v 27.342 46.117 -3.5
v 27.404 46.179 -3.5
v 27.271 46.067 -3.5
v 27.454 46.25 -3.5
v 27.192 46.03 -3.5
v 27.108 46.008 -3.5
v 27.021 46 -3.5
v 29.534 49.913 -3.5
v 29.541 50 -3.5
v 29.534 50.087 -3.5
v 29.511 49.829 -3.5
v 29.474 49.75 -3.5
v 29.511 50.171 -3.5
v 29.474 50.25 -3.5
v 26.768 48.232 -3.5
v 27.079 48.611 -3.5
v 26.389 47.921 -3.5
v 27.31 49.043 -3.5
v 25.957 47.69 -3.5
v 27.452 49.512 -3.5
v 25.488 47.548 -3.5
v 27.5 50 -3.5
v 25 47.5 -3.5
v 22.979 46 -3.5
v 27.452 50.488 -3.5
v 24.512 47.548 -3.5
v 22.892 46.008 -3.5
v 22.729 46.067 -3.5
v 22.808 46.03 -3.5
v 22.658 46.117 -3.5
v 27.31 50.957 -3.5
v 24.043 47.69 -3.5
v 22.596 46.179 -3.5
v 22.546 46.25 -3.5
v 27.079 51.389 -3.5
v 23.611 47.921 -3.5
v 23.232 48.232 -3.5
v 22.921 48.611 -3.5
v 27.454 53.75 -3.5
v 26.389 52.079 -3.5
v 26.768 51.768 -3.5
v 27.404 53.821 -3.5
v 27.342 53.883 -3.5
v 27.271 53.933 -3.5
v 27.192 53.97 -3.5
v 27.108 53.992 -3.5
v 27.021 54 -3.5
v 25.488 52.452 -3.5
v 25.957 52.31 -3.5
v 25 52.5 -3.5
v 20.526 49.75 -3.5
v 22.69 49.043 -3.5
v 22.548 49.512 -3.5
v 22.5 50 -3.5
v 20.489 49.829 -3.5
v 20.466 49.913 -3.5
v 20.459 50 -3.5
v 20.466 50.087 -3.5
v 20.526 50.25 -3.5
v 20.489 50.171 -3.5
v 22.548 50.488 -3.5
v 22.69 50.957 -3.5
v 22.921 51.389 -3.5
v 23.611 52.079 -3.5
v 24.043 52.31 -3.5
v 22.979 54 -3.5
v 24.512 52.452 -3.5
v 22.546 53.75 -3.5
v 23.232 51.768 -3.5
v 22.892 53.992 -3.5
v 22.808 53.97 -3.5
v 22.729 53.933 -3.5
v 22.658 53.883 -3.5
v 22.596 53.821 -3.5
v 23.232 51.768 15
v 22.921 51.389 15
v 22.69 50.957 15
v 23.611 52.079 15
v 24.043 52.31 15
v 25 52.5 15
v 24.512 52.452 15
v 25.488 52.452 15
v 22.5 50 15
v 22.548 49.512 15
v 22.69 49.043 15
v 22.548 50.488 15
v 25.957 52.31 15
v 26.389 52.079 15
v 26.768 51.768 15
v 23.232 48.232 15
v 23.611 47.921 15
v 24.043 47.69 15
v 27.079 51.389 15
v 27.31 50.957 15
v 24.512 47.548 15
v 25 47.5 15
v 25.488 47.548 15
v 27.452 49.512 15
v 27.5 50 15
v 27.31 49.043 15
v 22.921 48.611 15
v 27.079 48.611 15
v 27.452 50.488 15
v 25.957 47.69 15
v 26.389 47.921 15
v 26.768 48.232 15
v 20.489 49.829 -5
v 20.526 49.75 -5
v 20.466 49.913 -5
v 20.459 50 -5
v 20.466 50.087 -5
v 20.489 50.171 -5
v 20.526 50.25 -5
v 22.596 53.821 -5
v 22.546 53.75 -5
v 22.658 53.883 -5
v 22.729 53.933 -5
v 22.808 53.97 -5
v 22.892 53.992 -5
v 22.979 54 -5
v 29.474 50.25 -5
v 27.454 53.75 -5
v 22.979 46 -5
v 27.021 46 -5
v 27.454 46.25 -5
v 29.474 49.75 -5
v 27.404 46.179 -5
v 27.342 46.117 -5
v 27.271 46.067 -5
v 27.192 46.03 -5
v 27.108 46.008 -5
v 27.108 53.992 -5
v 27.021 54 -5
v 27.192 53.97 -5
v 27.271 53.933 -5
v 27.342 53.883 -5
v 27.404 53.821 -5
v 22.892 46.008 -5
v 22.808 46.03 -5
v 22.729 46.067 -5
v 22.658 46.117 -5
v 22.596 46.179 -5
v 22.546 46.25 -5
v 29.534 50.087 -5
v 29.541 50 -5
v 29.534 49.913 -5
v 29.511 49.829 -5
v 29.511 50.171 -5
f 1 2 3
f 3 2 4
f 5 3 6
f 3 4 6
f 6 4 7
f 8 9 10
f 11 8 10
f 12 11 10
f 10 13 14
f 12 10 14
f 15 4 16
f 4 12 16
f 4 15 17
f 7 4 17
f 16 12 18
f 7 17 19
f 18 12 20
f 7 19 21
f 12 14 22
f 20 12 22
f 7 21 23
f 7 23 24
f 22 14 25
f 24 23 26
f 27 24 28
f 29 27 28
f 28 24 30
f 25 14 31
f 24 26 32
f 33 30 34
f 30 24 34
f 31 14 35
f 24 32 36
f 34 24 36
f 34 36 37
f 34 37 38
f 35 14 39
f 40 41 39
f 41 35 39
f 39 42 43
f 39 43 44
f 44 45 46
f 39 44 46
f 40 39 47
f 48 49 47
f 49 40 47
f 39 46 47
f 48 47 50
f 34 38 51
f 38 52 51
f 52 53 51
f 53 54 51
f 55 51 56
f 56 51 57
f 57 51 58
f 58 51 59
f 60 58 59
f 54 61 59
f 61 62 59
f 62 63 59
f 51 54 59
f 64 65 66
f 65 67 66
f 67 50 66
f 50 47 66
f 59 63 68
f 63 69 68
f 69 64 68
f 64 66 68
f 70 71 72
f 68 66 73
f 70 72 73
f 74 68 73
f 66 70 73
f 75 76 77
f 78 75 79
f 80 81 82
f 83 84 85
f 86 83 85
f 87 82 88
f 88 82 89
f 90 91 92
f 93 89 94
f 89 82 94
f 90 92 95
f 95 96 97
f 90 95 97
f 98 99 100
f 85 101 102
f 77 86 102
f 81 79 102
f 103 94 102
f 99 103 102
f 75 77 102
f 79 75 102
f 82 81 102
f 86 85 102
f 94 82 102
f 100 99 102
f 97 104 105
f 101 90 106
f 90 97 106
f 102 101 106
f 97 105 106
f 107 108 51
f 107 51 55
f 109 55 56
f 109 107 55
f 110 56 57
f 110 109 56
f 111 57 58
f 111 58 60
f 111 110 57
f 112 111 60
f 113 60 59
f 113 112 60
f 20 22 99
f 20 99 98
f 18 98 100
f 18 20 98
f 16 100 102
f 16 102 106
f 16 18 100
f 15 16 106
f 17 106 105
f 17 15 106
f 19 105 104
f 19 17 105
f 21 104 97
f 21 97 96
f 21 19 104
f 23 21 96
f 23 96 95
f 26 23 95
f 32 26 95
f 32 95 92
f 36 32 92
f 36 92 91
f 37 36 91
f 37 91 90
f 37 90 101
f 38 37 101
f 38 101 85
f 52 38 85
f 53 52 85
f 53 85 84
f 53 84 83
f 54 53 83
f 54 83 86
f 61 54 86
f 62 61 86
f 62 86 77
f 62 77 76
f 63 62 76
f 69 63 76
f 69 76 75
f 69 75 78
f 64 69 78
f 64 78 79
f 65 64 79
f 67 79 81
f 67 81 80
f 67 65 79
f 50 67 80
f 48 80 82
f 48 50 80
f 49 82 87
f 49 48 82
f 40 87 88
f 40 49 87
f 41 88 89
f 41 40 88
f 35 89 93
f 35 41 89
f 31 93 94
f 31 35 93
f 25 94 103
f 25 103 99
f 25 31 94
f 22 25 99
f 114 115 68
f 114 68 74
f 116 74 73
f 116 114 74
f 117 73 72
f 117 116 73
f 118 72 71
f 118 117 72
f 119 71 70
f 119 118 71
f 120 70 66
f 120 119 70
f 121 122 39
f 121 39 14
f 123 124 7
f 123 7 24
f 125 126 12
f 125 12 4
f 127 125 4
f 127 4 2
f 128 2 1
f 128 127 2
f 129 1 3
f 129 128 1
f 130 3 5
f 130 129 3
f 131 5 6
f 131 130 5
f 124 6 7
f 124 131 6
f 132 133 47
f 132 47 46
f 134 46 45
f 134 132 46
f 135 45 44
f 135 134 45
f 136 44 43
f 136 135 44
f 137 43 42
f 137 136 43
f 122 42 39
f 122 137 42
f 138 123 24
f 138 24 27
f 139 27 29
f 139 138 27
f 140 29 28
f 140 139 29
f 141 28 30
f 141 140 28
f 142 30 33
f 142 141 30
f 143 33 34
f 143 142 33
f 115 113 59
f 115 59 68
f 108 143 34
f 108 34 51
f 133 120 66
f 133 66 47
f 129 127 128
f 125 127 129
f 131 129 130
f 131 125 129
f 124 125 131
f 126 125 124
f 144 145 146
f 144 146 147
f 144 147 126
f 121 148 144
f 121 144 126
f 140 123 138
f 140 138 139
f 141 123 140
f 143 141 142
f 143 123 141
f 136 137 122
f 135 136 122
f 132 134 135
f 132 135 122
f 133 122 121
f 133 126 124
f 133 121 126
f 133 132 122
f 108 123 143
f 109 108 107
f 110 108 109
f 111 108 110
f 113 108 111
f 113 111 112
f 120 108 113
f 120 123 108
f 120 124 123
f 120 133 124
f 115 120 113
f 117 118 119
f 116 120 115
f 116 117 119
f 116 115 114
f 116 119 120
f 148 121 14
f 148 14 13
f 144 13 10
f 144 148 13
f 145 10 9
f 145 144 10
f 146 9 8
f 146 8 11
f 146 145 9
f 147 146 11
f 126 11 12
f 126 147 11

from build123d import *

# Parameters (mm, degrees)
EXTRUDE008_DEPTH = 1.5
CIRCLE_R         = 2.5
EXTRUDE007_DEPTH = 20


with BuildPart() as extrude008:
    # Polygon → Extrude008 (new body)
    with BuildSketch(Plane.XY):
        with BuildLine():
            Line((2.453739, 3.75), (4.474465, 0.25))
            ThreePointArc((4.474465, 0.25), (4.541452, 0), (4.474465, -0.25))
            Line((4.474465, -0.25), (2.453739, -3.75))
            ThreePointArc((2.453739, -3.75), (2.270726, -3.933013), (2.020726, -4))
            Line((2.020726, -4), (-2.020726, -4))
            ThreePointArc((-2.020726, -4), (-2.270726, -3.933013), (-2.453739, -3.75))
            Line((-2.453739, -3.75), (-4.474465, -0.25))
            ThreePointArc((-4.474465, -0.25), (-4.541452, 0), (-4.474465, 0.25))
            Line((-4.474465, 0.25), (-2.453739, 3.75))
            ThreePointArc((-2.453739, 3.75), (-2.270726, 3.933013), (-2.020726, 4))
            Line((-2.020726, 4), (2.020726, 4))
            ThreePointArc((2.020726, 4), (2.270726, 3.933013), (2.453739, 3.75))
        make_face()
    extrude(amount=EXTRUDE008_DEPTH)


with BuildPart() as vis:
    # Circle → Extrude007 (new body)
    with BuildSketch(Plane(origin=(0, 0, 0), x_dir=(1, 0, 0), z_dir=(0, 0, -1))):
        Circle(CIRCLE_R)
    extrude(amount=-EXTRUDE007_DEPTH)

    # Fusion004: union Extrude008
    add(extrude008.part)


with BuildPart() as vis_1:
    # Fusion004 placement: moved
    add(vis.part.moved(Location((25, 50, -5))))


solid = vis_1.part
